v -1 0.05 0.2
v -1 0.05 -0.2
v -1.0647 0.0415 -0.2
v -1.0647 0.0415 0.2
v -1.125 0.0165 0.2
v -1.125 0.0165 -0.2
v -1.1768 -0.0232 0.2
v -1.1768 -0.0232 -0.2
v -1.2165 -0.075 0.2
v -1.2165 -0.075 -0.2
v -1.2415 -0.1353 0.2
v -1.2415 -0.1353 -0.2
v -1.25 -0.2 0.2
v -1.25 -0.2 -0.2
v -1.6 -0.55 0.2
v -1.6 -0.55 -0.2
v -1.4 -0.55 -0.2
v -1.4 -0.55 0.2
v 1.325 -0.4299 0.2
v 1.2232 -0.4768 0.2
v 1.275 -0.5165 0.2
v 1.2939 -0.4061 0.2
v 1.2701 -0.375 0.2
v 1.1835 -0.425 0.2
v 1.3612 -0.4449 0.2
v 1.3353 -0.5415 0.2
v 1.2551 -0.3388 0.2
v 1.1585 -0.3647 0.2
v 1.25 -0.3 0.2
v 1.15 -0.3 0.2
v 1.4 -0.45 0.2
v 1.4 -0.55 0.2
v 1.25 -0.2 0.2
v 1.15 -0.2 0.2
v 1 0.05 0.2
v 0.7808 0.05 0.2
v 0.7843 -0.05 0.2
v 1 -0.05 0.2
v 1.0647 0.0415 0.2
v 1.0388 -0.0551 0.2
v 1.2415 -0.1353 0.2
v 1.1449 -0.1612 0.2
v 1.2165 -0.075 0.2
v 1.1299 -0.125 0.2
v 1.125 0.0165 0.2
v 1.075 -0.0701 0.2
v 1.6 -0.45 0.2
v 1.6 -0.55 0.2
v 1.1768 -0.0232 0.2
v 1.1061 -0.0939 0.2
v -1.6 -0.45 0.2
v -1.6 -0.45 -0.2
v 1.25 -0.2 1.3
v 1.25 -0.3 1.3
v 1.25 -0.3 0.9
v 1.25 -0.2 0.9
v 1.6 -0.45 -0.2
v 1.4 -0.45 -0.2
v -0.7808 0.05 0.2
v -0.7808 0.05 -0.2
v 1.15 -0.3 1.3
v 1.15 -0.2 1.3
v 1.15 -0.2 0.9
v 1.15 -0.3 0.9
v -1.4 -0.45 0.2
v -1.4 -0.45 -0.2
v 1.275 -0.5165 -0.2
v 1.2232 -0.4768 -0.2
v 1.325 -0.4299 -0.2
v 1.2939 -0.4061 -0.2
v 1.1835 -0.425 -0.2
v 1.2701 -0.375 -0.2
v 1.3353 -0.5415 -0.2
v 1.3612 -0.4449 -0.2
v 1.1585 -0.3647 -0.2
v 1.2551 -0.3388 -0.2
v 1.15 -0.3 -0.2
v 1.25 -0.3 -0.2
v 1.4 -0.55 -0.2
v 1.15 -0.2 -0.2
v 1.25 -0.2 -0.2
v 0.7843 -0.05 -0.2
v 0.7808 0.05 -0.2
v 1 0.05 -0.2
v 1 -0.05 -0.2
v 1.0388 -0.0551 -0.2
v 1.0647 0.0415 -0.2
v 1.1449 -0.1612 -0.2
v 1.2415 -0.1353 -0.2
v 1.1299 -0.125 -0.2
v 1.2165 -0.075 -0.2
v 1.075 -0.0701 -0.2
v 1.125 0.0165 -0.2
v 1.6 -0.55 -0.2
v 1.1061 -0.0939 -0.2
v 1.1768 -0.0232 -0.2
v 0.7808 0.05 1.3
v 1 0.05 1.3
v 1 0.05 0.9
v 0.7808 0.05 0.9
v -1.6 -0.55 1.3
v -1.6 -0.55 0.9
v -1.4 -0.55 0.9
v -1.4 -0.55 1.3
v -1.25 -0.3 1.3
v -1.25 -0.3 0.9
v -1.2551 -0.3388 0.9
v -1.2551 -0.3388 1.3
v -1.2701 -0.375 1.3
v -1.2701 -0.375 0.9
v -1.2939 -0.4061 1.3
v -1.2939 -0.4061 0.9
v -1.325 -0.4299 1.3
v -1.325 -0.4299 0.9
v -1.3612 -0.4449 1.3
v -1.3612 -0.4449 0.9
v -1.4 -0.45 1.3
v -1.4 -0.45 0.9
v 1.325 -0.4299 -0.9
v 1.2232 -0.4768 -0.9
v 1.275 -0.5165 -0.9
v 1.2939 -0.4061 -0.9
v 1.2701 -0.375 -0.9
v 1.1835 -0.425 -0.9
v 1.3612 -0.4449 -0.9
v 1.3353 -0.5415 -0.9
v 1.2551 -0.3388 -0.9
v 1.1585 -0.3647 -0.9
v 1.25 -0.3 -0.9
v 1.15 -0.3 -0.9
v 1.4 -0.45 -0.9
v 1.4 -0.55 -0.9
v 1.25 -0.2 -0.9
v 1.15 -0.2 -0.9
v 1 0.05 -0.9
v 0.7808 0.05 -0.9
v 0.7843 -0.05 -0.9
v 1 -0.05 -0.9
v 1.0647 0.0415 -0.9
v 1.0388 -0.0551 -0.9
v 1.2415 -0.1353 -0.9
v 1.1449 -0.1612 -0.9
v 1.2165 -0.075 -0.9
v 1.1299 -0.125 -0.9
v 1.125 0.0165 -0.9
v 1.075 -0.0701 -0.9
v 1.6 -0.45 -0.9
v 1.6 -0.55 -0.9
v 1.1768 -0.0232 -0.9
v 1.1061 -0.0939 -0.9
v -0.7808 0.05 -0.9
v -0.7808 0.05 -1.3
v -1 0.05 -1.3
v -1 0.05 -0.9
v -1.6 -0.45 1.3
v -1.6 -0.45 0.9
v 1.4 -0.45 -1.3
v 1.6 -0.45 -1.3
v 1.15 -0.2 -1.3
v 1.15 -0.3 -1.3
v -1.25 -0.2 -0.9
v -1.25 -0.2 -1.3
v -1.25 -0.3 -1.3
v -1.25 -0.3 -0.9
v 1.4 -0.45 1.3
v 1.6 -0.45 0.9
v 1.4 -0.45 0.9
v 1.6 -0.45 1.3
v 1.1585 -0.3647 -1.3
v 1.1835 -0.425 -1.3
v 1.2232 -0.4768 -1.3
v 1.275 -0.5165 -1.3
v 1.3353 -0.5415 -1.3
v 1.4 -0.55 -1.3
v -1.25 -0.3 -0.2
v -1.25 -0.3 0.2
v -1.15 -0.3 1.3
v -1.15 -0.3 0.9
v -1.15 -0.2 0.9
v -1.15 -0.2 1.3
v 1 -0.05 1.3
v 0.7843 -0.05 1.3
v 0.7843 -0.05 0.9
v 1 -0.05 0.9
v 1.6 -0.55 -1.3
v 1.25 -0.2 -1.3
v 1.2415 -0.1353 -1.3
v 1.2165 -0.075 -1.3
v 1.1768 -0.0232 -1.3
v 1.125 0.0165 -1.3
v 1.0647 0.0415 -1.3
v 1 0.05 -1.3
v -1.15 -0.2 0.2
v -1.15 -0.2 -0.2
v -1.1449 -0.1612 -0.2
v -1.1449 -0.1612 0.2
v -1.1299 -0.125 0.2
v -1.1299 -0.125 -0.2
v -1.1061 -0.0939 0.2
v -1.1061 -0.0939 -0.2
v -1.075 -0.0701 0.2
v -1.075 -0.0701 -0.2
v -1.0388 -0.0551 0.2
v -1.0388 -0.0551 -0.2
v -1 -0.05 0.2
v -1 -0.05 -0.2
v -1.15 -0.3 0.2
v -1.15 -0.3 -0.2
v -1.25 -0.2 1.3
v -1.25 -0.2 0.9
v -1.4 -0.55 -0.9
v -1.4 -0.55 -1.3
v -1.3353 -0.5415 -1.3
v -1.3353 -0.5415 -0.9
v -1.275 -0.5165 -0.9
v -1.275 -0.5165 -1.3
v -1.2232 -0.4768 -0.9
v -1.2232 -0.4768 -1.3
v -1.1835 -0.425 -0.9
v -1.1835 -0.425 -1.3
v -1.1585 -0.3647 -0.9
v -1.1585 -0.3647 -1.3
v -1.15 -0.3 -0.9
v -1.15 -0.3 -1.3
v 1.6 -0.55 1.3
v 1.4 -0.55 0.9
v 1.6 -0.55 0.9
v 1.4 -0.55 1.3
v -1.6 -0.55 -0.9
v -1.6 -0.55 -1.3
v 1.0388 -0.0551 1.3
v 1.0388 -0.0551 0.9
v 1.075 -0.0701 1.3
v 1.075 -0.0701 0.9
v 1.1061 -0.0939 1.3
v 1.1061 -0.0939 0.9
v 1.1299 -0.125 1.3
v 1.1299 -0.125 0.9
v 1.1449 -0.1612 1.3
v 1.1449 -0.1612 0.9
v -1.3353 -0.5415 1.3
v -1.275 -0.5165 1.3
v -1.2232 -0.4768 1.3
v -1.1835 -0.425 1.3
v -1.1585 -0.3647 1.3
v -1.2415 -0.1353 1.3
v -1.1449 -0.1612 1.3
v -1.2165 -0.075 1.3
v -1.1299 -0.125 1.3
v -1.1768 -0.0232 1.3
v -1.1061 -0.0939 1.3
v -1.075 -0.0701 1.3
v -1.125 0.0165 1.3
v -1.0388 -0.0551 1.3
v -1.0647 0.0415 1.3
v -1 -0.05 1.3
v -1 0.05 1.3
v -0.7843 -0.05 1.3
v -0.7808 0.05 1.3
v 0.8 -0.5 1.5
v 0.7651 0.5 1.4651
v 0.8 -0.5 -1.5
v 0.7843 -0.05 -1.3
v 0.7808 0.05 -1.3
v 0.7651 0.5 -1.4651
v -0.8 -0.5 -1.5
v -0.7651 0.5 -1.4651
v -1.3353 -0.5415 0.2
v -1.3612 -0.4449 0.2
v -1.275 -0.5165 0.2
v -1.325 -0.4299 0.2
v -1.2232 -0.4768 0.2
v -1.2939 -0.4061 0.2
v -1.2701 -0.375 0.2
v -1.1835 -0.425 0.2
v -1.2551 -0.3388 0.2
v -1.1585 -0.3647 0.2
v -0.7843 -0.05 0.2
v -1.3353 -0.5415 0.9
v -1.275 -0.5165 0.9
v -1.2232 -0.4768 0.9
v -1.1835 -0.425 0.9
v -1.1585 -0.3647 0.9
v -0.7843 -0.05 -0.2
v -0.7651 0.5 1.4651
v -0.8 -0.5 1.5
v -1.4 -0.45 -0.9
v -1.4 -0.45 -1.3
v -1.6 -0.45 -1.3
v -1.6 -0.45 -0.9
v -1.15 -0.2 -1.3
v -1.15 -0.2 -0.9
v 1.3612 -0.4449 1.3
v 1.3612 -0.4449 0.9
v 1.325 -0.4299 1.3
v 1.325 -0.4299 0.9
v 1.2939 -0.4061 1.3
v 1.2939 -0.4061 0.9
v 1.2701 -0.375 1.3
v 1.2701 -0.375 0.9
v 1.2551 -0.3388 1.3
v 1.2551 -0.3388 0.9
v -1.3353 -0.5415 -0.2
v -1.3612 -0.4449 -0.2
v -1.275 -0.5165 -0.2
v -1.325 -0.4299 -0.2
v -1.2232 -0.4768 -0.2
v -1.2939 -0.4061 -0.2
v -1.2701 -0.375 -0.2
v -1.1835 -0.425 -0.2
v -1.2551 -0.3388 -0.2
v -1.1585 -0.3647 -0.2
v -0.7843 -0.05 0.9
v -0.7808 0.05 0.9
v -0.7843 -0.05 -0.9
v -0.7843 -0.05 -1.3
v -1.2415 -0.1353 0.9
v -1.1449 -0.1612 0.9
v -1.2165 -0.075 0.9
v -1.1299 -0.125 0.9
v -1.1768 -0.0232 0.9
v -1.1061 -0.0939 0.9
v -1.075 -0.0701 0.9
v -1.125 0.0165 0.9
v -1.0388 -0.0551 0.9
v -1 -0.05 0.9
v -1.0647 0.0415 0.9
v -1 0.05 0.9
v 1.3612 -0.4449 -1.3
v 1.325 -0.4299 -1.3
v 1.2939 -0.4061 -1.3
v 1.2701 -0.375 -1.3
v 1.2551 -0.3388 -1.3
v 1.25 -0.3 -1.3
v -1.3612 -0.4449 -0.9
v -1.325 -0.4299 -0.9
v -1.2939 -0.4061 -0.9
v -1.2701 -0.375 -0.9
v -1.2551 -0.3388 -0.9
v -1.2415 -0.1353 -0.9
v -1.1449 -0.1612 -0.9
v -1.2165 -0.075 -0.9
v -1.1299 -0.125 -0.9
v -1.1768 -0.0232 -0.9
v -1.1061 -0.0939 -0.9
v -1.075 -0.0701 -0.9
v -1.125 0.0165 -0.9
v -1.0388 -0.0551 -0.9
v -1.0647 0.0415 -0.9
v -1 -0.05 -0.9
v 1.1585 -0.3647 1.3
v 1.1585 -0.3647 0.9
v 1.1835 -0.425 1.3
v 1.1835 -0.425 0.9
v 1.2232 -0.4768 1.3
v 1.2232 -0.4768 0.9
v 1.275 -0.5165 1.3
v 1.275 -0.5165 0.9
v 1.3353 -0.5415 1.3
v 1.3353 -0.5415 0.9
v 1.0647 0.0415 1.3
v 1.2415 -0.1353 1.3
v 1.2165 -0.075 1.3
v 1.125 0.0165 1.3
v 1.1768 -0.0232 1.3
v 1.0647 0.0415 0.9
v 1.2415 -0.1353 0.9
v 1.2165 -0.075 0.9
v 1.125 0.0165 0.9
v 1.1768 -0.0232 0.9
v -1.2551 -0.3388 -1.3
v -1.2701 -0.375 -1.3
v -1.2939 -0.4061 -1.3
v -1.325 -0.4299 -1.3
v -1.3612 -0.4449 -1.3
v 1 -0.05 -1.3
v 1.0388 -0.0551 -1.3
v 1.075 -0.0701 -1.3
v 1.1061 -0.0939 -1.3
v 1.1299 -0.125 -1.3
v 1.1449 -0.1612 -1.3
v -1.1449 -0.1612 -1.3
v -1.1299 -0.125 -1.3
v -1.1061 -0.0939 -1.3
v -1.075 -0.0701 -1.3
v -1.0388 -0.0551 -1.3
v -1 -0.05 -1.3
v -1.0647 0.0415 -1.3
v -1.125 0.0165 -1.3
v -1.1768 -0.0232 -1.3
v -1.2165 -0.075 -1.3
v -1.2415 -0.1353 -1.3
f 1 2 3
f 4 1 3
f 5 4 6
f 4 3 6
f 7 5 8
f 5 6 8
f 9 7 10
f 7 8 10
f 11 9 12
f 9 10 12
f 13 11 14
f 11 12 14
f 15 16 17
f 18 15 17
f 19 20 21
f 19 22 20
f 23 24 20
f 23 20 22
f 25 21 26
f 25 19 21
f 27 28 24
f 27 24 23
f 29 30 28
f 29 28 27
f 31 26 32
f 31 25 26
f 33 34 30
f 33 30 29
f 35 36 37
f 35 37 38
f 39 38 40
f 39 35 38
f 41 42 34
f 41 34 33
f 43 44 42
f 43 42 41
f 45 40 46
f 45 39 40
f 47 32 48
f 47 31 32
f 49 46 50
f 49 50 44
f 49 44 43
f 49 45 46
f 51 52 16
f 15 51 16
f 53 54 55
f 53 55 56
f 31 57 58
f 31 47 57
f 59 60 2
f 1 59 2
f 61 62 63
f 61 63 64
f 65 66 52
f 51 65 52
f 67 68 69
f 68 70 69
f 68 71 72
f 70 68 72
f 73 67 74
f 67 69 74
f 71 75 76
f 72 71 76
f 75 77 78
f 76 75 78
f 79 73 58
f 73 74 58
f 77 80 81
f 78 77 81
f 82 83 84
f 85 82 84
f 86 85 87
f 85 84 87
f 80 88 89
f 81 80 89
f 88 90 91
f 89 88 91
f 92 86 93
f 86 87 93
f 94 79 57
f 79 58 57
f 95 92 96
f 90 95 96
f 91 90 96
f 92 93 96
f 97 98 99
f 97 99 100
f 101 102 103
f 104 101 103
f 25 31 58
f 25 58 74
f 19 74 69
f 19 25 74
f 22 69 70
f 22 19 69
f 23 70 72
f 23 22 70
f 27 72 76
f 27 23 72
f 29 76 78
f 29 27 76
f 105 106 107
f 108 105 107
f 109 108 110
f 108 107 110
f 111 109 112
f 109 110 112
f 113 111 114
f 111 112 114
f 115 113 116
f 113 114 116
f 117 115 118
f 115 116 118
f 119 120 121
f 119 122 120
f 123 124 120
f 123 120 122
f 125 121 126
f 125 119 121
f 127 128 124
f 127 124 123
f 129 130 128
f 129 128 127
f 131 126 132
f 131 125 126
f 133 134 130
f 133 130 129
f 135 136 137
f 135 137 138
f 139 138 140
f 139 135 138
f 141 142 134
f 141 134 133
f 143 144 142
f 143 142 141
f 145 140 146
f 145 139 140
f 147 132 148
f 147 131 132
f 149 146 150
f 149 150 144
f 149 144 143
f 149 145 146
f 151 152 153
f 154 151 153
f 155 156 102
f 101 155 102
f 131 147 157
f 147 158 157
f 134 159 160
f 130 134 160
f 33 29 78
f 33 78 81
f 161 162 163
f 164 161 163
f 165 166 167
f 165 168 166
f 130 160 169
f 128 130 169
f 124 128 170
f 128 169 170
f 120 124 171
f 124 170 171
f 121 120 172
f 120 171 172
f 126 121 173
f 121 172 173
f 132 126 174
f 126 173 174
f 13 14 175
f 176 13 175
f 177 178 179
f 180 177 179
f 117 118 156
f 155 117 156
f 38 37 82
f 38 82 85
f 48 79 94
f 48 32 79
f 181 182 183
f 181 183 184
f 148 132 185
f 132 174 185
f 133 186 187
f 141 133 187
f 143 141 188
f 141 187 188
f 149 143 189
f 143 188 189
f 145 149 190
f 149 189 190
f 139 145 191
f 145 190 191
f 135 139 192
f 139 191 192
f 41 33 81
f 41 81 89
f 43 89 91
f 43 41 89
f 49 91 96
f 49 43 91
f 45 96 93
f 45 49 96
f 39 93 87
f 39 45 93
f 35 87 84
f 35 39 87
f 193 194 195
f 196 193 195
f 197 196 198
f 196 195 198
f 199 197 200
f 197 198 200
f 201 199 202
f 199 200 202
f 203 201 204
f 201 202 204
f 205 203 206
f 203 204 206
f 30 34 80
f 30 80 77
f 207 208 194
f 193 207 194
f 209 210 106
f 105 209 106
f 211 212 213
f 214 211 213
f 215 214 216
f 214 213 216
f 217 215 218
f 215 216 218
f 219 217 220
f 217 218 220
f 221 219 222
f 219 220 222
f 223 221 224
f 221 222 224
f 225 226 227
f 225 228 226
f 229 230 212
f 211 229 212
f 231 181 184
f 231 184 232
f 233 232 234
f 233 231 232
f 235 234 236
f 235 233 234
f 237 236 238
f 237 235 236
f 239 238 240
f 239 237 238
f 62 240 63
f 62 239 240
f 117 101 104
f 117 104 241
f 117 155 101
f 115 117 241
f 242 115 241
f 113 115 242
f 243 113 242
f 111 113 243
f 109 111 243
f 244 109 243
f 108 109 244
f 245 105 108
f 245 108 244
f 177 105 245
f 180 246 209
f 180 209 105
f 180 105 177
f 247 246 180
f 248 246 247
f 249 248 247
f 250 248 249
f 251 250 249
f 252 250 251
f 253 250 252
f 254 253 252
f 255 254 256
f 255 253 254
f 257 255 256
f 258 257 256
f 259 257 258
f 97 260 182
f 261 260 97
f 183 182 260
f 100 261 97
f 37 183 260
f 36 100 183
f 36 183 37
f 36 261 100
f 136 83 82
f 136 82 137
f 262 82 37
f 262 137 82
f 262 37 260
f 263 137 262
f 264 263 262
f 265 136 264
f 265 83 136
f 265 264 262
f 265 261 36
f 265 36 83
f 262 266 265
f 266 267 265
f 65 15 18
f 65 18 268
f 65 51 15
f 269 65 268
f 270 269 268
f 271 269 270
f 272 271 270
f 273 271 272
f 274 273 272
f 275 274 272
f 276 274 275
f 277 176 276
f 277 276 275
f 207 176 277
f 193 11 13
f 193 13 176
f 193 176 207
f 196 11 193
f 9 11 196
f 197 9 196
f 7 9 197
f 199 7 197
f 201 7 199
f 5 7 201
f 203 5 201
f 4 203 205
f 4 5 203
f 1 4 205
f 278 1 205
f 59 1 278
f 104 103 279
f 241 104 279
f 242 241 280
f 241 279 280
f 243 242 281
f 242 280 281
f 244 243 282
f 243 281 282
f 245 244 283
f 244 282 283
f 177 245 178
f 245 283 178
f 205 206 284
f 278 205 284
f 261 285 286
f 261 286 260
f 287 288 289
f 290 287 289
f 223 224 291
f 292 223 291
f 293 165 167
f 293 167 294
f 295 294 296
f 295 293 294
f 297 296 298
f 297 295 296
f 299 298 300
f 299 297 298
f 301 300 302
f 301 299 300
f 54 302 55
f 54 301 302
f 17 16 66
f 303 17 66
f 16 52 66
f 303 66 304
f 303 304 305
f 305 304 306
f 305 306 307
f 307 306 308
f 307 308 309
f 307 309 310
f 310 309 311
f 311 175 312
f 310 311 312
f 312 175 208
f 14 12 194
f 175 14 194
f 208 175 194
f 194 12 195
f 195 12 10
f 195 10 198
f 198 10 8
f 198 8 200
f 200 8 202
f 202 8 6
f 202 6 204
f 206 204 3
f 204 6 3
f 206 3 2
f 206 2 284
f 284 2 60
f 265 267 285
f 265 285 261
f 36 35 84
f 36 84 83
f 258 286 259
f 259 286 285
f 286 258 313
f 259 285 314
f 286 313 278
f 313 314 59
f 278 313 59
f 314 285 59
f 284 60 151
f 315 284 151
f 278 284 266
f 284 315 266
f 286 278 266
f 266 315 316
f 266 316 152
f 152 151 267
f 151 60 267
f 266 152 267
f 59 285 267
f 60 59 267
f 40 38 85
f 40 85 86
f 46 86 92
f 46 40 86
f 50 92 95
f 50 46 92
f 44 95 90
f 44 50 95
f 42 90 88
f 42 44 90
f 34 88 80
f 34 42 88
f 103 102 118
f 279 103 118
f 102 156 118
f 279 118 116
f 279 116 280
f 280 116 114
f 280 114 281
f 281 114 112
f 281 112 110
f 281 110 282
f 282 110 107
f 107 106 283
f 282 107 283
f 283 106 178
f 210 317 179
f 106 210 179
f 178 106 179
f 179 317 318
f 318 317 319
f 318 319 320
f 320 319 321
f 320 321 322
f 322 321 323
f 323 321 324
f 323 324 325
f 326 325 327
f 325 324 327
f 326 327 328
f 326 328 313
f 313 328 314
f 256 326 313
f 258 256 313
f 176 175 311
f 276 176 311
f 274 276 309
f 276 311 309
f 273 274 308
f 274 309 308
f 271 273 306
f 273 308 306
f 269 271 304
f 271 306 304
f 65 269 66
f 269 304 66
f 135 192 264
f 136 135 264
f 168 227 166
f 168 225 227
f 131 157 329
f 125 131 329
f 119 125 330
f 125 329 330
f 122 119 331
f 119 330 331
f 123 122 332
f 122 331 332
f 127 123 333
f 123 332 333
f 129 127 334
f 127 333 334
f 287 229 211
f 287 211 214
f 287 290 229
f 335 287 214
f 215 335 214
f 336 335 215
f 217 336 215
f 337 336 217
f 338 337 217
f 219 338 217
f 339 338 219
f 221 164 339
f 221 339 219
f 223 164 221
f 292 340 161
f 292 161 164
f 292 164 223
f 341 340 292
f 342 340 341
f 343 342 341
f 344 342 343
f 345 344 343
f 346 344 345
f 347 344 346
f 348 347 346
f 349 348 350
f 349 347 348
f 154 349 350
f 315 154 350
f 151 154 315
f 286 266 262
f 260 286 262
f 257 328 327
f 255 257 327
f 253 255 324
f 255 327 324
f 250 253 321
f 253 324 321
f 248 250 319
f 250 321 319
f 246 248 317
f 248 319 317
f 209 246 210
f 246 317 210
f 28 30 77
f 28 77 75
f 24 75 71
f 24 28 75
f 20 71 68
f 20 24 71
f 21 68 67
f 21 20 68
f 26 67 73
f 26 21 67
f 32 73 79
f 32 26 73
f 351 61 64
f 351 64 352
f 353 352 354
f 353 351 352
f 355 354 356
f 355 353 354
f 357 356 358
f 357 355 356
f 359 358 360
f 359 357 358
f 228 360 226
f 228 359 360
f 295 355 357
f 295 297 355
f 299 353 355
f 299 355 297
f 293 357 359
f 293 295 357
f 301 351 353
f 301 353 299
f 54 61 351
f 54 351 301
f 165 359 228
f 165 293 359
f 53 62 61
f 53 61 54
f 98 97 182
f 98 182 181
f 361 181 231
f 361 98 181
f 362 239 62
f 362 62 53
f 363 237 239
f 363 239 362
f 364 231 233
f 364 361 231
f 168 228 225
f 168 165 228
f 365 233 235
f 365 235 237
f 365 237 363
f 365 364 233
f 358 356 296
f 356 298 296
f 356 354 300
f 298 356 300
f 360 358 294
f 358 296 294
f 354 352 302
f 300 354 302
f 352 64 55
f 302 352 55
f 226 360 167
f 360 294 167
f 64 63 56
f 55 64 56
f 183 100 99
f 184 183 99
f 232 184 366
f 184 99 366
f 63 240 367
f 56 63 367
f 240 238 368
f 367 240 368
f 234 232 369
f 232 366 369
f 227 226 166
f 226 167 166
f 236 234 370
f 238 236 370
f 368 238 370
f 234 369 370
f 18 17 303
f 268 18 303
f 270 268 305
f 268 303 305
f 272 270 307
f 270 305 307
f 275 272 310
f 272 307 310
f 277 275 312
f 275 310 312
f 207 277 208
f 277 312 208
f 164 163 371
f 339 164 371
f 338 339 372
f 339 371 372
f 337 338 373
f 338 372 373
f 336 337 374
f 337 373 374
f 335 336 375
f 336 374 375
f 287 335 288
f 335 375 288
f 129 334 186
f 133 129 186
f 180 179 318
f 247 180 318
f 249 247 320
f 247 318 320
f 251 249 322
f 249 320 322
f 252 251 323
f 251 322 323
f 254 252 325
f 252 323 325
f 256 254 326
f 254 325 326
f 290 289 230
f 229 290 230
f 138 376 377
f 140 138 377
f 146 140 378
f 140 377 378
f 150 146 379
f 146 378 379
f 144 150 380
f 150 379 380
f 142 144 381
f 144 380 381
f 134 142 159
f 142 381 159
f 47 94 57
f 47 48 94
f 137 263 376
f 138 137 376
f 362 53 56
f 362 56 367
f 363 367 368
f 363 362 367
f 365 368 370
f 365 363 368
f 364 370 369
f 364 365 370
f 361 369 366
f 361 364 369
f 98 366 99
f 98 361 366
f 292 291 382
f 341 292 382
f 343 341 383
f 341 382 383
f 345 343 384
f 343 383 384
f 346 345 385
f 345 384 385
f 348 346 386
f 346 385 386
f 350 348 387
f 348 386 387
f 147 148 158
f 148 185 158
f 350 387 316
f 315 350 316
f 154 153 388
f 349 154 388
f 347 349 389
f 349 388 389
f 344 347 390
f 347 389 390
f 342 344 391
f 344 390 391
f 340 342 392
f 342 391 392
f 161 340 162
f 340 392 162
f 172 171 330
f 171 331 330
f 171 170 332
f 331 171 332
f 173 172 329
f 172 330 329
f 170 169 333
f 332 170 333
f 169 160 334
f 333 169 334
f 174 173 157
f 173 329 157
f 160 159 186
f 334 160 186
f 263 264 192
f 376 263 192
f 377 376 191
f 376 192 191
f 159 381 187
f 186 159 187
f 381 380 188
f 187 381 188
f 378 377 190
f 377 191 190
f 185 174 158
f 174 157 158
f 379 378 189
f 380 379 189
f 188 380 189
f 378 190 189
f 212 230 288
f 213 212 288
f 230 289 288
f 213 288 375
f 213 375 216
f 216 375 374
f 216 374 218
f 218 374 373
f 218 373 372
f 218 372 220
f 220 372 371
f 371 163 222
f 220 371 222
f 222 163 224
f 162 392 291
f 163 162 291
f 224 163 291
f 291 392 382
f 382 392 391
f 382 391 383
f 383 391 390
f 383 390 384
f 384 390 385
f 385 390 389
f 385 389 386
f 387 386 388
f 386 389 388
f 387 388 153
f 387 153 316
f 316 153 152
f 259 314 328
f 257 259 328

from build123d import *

# Parameters (mm, degrees)
BASES_W         = 1.6
BASES_H         = 3
BASE_DEPTH      = 0.5
LEG2_DEPTH      = 0.2
MIDDLELEG_DEPTH = 0.2
BODYDRAFT_ANGLE = -2
MIRROR1_START   = -1.3
MIRROR1_DEPTH   = 0.4
MIRROR1_START_2 = -0.2
MIRROR1_2_DEPTH = 0.4
MIRROR1_START_3 = 0.9
MIRROR1_3_DEPTH = 0.4


# Read off the part's stored shape, not the designer's step: Mirror1
with BuildPart() as part:
    # BaseS → Base (new, symmetric)
    with BuildSketch(Plane(origin=(0, 0, 0), x_dir=(1, 0, 0), z_dir=(0, 1, 0))):
        Rectangle(BASES_W, BASES_H)
    extrude(amount=BASE_DEPTH, both=True)

    # Leg2S → Leg2 (add, symmetric)
    with BuildSketch(Plane.XY.offset(1.1)):
        with BuildLine():
            Line((1.6, -0.45), (1.4, -0.45))
            ThreePointArc((1.4, -0.45), (1.293933983, -0.406066017), (1.25, -0.3))
            Line((1.25, -0.3), (1.25, -0.2))
            ThreePointArc((1.25, -0.2), (1.176776695, -0.023223305), (1, 0.05))
            Line((1, 0.05), (0.8, 0.05))
            Line((0.8, 0.05), (0.8, -0.05))
            Line((0.8, -0.05), (1, -0.05))
            ThreePointArc((1, -0.05), (1.106066017, -0.093933983), (1.15, -0.2))
            Line((1.15, -0.2), (1.15, -0.3))
            ThreePointArc((1.15, -0.3), (1.223223305, -0.476776695), (1.4, -0.55))
            Line((1.4, -0.55), (1.6, -0.55))
            Line((1.6, -0.55), (1.6, -0.45))
        make_face()
    leg2 = extrude(amount=LEG2_DEPTH, both=True)

    # Leg2M: Leg2 across plane
    add(leg2.mirror(Plane.XY))

    # MiddleLegS → MiddleLeg (add, symmetric)
    with BuildSketch(Plane.XY):
        with BuildLine():
            Line((1.6, -0.45), (1.4, -0.45))
            ThreePointArc((1.4, -0.45), (1.293933983, -0.406066017), (1.25, -0.3))
            Line((1.25, -0.3), (1.25, -0.2))
            ThreePointArc((1.25, -0.2), (1.176776695, -0.023223305), (1, 0.05))
            Line((1, 0.05), (0.8, 0.05))
            Line((0.8, 0.05), (0.8, -0.05))
            Line((0.8, -0.05), (1, -0.05))
            ThreePointArc((1, -0.05), (1.106066017, -0.093933983), (1.15, -0.2))
            Line((1.15, -0.2), (1.15, -0.3))
            ThreePointArc((1.15, -0.3), (1.223223305, -0.476776695), (1.4, -0.55))
            Line((1.4, -0.55), (1.6, -0.55))
            Line((1.6, -0.55), (1.6, -0.45))
        make_face()
    extrude(amount=MIDDLELEG_DEPTH, both=True)

    # BodyDraft
    bodydraft_faces = [part.faces().sort_by_distance(p)[0] for p in [
        (0.8, -0.468377223, 0),
        (0, 0, -1.5),
        (-0.8, 0, 0),
        (0, 0, 1.5),
    ]]
    draft(bodydraft_faces, Plane(origin=(0, -0.5, 0), x_dir=(0, 0, -1), z_dir=(0, -1, 0)), BODYDRAFT_ANGLE)

    # Mirror1 outline → Mirror1 (add)
    with BuildSketch(Plane.XY.offset(MIRROR1_START)):
        with BuildLine():
            Line((-1.6, -0.55), (-1.4, -0.55))
            ThreePointArc((-1.4, -0.55), (-1.223223305, -0.476776695), (-1.15, -0.3))
            Line((-1.15, -0.3), (-1.15, -0.2))
            ThreePointArc((-1.15, -0.2), (-1.106066017, -0.093933983), (-1, -0.05))
            Line((-1, -0.05), (-0.784285654, -0.05))
            Line((-0.784285654, -0.05), (-0.780793577, 0.05))
            Line((-0.780793577, 0.05), (-1, 0.05))
            ThreePointArc((-1, 0.05), (-1.176776695, -0.023223305), (-1.25, -0.2))
            Line((-1.25, -0.2), (-1.25, -0.3))
            ThreePointArc((-1.25, -0.3), (-1.293933983, -0.406066017), (-1.4, -0.45))
            Line((-1.4, -0.45), (-1.6, -0.45))
            Line((-1.6, -0.45), (-1.6, -0.55))
        make_face()
    extrude(amount=MIRROR1_DEPTH)

    # Mirror1 2 outline → Mirror1 2 (add)
    with BuildSketch(Plane.XY.offset(MIRROR1_START_2)):
        with BuildLine():
            Line((-1.6, -0.55), (-1.4, -0.55))
            ThreePointArc((-1.4, -0.55), (-1.223223305, -0.476776695), (-1.15, -0.3))
            Line((-1.15, -0.3), (-1.15, -0.2))
            ThreePointArc((-1.15, -0.2), (-1.106066017, -0.093933983), (-1, -0.05))
            Line((-1, -0.05), (-0.784285654, -0.05))
            Line((-0.784285654, -0.05), (-0.780793577, 0.05))
            Line((-0.780793577, 0.05), (-1, 0.05))
            ThreePointArc((-1, 0.05), (-1.176776695, -0.023223305), (-1.25, -0.2))
            Line((-1.25, -0.2), (-1.25, -0.3))
            ThreePointArc((-1.25, -0.3), (-1.293933983, -0.406066017), (-1.4, -0.45))
            Line((-1.4, -0.45), (-1.6, -0.45))
            Line((-1.6, -0.45), (-1.6, -0.55))
        make_face()
    extrude(amount=MIRROR1_2_DEPTH)

    # Mirror1 3 outline → Mirror1 3 (add)
    with BuildSketch(Plane.XY.offset(MIRROR1_START_3)):
        with BuildLine():
            Line((-1.6, -0.55), (-1.4, -0.55))
            ThreePointArc((-1.4, -0.55), (-1.223223305, -0.476776695), (-1.15, -0.3))
            Line((-1.15, -0.3), (-1.15, -0.2))
            ThreePointArc((-1.15, -0.2), (-1.106066017, -0.093933983), (-1, -0.05))
            Line((-1, -0.05), (-0.784285654, -0.05))
            Line((-0.784285654, -0.05), (-0.780793577, 0.05))
            Line((-0.780793577, 0.05), (-1, 0.05))
            ThreePointArc((-1, 0.05), (-1.176776695, -0.023223305), (-1.25, -0.2))
            Line((-1.25, -0.2), (-1.25, -0.3))
            ThreePointArc((-1.25, -0.3), (-1.293933983, -0.406066017), (-1.4, -0.45))
            Line((-1.4, -0.45), (-1.6, -0.45))
            Line((-1.6, -0.45), (-1.6, -0.55))
        make_face()
    extrude(amount=MIRROR1_3_DEPTH)


solid = part.part
